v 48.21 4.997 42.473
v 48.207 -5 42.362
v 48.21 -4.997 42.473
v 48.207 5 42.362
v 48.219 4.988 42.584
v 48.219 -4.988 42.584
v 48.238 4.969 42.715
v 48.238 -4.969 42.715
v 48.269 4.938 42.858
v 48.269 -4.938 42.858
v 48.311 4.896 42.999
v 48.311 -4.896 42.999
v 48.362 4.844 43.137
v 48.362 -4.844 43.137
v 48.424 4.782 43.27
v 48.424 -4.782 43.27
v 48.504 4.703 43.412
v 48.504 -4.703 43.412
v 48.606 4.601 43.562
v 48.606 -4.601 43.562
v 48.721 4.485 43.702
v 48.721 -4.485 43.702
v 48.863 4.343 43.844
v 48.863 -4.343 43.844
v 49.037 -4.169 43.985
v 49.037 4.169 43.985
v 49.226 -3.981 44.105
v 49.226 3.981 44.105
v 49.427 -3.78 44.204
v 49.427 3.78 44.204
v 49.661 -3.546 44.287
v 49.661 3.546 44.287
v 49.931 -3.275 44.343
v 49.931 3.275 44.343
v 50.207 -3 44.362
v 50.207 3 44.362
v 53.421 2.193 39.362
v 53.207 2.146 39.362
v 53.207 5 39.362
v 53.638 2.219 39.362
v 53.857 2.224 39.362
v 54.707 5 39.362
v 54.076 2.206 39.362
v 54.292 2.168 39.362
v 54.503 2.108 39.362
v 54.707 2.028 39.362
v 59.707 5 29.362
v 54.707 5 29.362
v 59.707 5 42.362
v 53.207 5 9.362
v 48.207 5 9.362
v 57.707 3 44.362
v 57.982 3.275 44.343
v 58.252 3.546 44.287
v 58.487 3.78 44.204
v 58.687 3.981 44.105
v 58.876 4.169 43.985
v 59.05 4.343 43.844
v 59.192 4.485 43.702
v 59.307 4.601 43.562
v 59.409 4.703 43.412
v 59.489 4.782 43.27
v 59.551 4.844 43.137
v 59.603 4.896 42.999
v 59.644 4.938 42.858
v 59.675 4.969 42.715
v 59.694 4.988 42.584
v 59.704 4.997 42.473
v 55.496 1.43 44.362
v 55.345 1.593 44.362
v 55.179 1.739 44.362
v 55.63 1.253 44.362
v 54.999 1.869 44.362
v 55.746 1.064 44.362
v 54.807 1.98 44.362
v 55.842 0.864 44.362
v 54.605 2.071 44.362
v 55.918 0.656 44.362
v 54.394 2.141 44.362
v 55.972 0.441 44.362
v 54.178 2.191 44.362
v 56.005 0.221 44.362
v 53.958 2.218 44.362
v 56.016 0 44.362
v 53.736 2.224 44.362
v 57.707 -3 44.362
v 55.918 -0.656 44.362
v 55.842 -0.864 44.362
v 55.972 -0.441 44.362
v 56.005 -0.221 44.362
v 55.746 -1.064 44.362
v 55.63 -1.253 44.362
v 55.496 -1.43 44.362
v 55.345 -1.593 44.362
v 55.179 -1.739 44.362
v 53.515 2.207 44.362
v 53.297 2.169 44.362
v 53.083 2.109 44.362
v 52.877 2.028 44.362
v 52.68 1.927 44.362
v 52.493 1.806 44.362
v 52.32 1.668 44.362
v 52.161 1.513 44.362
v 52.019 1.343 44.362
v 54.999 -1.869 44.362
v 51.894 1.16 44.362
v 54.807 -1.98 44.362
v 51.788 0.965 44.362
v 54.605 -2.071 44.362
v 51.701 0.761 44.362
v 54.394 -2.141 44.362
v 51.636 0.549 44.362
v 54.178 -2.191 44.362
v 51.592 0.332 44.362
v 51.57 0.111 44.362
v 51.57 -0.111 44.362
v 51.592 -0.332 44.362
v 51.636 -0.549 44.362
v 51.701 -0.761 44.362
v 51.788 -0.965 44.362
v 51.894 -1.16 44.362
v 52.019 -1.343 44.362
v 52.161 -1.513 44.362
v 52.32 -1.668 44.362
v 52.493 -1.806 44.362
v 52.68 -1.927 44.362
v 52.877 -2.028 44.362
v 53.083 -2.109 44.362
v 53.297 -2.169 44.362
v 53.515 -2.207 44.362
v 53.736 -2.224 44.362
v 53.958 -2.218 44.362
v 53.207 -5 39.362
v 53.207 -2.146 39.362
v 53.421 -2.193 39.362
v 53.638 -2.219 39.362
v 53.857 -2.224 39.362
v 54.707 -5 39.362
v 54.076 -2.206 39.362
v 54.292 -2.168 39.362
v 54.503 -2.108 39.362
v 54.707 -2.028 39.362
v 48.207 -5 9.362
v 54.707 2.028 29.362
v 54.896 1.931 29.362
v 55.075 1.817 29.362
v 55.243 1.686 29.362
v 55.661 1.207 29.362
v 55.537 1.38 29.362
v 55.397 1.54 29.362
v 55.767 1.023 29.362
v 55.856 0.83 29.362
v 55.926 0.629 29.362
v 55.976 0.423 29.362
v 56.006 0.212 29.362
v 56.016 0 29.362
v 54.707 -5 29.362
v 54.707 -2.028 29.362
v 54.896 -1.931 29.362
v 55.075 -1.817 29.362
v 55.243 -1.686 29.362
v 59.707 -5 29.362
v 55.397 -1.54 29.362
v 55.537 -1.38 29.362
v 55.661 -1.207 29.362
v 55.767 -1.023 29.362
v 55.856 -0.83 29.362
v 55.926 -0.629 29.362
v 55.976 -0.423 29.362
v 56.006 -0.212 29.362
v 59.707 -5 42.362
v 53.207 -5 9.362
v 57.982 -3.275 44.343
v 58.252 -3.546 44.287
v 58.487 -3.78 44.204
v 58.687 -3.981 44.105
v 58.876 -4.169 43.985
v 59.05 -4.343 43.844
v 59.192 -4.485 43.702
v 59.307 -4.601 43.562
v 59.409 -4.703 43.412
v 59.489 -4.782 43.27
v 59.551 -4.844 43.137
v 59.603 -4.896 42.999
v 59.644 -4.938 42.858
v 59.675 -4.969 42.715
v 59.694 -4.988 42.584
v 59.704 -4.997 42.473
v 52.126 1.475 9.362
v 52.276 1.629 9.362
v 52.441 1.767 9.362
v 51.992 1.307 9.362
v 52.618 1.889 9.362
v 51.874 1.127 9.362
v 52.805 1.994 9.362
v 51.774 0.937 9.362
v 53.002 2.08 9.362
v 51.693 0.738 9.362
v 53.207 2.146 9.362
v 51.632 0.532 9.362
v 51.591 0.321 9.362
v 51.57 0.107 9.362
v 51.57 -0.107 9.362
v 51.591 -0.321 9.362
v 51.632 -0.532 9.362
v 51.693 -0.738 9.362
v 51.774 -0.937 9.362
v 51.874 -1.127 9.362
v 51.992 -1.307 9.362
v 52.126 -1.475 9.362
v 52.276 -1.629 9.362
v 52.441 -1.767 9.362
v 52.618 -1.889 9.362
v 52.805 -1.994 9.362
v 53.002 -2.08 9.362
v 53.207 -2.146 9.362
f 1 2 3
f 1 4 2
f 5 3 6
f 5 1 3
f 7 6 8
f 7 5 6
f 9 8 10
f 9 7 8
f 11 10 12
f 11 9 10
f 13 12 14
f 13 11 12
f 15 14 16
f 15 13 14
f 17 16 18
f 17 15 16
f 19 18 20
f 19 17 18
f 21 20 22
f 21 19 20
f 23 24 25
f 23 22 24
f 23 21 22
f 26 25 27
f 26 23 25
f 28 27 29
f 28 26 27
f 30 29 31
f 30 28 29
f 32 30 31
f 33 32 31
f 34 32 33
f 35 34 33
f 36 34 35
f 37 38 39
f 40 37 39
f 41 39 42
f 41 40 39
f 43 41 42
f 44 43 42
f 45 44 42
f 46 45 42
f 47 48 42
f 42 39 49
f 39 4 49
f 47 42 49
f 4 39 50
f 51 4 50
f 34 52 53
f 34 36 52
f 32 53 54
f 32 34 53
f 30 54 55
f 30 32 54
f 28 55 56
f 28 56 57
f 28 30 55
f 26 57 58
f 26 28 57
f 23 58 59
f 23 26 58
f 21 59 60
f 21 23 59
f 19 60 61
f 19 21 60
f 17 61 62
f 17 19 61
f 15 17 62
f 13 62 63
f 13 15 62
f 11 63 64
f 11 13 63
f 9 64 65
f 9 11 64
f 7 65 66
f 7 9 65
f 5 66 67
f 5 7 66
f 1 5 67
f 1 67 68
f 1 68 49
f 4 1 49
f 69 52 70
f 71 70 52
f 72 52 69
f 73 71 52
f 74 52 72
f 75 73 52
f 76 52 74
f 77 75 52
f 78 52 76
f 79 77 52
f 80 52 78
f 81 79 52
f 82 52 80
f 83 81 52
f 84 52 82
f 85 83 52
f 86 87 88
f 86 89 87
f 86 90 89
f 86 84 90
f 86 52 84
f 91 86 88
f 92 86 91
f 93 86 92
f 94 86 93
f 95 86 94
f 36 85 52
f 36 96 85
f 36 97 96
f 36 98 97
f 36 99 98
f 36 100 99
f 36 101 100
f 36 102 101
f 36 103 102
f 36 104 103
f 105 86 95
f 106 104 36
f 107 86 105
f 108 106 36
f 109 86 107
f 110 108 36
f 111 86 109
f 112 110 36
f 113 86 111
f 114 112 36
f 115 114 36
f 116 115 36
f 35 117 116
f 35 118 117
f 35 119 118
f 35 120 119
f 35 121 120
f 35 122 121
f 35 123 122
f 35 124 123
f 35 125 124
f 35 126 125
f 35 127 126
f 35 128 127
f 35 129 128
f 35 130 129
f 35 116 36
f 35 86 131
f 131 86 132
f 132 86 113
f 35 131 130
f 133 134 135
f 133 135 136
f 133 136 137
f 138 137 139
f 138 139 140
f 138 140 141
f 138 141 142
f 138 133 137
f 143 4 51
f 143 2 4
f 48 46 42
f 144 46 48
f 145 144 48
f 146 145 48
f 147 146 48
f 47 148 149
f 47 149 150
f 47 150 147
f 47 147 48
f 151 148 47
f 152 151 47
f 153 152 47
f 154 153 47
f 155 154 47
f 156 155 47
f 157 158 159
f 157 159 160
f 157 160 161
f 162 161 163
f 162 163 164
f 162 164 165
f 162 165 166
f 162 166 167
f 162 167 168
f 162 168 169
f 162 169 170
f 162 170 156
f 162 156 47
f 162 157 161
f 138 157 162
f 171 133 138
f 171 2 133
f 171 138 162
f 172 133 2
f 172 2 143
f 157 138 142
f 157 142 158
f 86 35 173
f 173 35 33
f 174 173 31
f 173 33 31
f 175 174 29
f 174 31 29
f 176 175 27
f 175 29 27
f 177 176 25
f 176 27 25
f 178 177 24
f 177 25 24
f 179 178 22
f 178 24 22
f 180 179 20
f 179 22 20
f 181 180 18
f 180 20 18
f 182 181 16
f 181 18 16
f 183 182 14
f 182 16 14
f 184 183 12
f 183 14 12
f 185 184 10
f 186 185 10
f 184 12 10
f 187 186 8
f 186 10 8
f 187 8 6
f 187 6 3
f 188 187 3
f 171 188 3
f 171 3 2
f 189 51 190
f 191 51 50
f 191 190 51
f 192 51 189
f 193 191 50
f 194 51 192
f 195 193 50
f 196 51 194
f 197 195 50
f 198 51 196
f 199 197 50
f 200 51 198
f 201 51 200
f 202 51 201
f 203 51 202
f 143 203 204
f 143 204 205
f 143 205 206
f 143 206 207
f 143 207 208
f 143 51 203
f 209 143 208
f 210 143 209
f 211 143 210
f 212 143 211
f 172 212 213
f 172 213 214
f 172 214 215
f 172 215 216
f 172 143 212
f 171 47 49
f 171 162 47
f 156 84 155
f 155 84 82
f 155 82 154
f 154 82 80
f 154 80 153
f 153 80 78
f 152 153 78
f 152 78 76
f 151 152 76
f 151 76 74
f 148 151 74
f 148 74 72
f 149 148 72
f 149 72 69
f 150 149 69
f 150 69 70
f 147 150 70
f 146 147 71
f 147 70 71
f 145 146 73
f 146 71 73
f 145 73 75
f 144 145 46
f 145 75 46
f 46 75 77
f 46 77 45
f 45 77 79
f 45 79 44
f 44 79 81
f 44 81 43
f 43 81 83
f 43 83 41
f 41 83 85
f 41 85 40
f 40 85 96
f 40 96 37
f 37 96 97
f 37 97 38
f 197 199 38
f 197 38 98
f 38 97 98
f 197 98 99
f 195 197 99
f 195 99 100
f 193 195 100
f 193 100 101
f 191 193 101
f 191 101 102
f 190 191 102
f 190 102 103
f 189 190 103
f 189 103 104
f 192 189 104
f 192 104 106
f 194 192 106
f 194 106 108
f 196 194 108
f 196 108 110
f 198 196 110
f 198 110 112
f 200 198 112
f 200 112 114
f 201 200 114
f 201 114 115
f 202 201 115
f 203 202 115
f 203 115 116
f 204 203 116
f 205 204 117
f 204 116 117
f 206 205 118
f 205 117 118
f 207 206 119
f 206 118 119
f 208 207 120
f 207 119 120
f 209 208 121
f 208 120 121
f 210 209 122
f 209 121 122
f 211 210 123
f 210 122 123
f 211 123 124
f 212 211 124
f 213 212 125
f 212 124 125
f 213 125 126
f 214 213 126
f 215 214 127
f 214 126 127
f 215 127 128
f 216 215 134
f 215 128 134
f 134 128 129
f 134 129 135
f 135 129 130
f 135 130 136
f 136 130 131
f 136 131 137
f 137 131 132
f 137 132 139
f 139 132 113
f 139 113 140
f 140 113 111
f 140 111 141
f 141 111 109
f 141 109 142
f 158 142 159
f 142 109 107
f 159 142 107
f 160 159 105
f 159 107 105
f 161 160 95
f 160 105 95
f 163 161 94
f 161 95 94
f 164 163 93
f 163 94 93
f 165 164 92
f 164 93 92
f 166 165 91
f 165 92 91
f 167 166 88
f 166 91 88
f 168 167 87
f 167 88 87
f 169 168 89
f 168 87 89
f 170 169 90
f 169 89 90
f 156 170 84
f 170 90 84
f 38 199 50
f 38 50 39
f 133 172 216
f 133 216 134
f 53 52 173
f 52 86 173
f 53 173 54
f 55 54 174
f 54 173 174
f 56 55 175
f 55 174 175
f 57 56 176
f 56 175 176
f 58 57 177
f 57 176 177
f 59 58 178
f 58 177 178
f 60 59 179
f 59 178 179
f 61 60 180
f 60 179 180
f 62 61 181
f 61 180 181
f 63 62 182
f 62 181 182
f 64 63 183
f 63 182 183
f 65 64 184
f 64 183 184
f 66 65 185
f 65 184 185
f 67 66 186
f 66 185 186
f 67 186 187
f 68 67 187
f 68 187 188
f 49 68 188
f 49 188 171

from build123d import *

# Parameters (mm, degrees)
F1_DEPTH = 5
F2_R     = 2
F3_R     = 2.224598
F4_DEPTH = 35.001


with BuildPart() as f1:
    # F0 (on Front) → F1 (new body, symmetric)
    with BuildSketch(Plane.XZ):
        Polygon((53.206599, 9.36247), (53.206599, 39.36247), (54.706599, 39.36247), (54.706599, 29.36247), (59.706599, 29.36247), (59.706599, 44.36247), (48.206599, 44.36247), (48.206599, 9.36247), align=None)
    extrude(amount=F1_DEPTH, both=True)

    # F2
    f2_edges = [f1.edges().sort_by_distance(p)[0] for p in [
        (59.706599, 0, 44.36247),
        (53.956599, 5, 44.36247),
        (53.956599, -5, 44.36247),
        (48.206599, 0, 44.36247),
    ]]
    fillet(f2_edges, radius=F2_R)

    # F3 (on face) → F4 (cut, through all)
    with BuildSketch(Plane.XY.offset(44.36247)):
        with Locations((53.791892, 0)):
            Circle(F3_R)
    extrude(amount=-F4_DEPTH, mode=Mode.SUBTRACT)


solid = f1.part
